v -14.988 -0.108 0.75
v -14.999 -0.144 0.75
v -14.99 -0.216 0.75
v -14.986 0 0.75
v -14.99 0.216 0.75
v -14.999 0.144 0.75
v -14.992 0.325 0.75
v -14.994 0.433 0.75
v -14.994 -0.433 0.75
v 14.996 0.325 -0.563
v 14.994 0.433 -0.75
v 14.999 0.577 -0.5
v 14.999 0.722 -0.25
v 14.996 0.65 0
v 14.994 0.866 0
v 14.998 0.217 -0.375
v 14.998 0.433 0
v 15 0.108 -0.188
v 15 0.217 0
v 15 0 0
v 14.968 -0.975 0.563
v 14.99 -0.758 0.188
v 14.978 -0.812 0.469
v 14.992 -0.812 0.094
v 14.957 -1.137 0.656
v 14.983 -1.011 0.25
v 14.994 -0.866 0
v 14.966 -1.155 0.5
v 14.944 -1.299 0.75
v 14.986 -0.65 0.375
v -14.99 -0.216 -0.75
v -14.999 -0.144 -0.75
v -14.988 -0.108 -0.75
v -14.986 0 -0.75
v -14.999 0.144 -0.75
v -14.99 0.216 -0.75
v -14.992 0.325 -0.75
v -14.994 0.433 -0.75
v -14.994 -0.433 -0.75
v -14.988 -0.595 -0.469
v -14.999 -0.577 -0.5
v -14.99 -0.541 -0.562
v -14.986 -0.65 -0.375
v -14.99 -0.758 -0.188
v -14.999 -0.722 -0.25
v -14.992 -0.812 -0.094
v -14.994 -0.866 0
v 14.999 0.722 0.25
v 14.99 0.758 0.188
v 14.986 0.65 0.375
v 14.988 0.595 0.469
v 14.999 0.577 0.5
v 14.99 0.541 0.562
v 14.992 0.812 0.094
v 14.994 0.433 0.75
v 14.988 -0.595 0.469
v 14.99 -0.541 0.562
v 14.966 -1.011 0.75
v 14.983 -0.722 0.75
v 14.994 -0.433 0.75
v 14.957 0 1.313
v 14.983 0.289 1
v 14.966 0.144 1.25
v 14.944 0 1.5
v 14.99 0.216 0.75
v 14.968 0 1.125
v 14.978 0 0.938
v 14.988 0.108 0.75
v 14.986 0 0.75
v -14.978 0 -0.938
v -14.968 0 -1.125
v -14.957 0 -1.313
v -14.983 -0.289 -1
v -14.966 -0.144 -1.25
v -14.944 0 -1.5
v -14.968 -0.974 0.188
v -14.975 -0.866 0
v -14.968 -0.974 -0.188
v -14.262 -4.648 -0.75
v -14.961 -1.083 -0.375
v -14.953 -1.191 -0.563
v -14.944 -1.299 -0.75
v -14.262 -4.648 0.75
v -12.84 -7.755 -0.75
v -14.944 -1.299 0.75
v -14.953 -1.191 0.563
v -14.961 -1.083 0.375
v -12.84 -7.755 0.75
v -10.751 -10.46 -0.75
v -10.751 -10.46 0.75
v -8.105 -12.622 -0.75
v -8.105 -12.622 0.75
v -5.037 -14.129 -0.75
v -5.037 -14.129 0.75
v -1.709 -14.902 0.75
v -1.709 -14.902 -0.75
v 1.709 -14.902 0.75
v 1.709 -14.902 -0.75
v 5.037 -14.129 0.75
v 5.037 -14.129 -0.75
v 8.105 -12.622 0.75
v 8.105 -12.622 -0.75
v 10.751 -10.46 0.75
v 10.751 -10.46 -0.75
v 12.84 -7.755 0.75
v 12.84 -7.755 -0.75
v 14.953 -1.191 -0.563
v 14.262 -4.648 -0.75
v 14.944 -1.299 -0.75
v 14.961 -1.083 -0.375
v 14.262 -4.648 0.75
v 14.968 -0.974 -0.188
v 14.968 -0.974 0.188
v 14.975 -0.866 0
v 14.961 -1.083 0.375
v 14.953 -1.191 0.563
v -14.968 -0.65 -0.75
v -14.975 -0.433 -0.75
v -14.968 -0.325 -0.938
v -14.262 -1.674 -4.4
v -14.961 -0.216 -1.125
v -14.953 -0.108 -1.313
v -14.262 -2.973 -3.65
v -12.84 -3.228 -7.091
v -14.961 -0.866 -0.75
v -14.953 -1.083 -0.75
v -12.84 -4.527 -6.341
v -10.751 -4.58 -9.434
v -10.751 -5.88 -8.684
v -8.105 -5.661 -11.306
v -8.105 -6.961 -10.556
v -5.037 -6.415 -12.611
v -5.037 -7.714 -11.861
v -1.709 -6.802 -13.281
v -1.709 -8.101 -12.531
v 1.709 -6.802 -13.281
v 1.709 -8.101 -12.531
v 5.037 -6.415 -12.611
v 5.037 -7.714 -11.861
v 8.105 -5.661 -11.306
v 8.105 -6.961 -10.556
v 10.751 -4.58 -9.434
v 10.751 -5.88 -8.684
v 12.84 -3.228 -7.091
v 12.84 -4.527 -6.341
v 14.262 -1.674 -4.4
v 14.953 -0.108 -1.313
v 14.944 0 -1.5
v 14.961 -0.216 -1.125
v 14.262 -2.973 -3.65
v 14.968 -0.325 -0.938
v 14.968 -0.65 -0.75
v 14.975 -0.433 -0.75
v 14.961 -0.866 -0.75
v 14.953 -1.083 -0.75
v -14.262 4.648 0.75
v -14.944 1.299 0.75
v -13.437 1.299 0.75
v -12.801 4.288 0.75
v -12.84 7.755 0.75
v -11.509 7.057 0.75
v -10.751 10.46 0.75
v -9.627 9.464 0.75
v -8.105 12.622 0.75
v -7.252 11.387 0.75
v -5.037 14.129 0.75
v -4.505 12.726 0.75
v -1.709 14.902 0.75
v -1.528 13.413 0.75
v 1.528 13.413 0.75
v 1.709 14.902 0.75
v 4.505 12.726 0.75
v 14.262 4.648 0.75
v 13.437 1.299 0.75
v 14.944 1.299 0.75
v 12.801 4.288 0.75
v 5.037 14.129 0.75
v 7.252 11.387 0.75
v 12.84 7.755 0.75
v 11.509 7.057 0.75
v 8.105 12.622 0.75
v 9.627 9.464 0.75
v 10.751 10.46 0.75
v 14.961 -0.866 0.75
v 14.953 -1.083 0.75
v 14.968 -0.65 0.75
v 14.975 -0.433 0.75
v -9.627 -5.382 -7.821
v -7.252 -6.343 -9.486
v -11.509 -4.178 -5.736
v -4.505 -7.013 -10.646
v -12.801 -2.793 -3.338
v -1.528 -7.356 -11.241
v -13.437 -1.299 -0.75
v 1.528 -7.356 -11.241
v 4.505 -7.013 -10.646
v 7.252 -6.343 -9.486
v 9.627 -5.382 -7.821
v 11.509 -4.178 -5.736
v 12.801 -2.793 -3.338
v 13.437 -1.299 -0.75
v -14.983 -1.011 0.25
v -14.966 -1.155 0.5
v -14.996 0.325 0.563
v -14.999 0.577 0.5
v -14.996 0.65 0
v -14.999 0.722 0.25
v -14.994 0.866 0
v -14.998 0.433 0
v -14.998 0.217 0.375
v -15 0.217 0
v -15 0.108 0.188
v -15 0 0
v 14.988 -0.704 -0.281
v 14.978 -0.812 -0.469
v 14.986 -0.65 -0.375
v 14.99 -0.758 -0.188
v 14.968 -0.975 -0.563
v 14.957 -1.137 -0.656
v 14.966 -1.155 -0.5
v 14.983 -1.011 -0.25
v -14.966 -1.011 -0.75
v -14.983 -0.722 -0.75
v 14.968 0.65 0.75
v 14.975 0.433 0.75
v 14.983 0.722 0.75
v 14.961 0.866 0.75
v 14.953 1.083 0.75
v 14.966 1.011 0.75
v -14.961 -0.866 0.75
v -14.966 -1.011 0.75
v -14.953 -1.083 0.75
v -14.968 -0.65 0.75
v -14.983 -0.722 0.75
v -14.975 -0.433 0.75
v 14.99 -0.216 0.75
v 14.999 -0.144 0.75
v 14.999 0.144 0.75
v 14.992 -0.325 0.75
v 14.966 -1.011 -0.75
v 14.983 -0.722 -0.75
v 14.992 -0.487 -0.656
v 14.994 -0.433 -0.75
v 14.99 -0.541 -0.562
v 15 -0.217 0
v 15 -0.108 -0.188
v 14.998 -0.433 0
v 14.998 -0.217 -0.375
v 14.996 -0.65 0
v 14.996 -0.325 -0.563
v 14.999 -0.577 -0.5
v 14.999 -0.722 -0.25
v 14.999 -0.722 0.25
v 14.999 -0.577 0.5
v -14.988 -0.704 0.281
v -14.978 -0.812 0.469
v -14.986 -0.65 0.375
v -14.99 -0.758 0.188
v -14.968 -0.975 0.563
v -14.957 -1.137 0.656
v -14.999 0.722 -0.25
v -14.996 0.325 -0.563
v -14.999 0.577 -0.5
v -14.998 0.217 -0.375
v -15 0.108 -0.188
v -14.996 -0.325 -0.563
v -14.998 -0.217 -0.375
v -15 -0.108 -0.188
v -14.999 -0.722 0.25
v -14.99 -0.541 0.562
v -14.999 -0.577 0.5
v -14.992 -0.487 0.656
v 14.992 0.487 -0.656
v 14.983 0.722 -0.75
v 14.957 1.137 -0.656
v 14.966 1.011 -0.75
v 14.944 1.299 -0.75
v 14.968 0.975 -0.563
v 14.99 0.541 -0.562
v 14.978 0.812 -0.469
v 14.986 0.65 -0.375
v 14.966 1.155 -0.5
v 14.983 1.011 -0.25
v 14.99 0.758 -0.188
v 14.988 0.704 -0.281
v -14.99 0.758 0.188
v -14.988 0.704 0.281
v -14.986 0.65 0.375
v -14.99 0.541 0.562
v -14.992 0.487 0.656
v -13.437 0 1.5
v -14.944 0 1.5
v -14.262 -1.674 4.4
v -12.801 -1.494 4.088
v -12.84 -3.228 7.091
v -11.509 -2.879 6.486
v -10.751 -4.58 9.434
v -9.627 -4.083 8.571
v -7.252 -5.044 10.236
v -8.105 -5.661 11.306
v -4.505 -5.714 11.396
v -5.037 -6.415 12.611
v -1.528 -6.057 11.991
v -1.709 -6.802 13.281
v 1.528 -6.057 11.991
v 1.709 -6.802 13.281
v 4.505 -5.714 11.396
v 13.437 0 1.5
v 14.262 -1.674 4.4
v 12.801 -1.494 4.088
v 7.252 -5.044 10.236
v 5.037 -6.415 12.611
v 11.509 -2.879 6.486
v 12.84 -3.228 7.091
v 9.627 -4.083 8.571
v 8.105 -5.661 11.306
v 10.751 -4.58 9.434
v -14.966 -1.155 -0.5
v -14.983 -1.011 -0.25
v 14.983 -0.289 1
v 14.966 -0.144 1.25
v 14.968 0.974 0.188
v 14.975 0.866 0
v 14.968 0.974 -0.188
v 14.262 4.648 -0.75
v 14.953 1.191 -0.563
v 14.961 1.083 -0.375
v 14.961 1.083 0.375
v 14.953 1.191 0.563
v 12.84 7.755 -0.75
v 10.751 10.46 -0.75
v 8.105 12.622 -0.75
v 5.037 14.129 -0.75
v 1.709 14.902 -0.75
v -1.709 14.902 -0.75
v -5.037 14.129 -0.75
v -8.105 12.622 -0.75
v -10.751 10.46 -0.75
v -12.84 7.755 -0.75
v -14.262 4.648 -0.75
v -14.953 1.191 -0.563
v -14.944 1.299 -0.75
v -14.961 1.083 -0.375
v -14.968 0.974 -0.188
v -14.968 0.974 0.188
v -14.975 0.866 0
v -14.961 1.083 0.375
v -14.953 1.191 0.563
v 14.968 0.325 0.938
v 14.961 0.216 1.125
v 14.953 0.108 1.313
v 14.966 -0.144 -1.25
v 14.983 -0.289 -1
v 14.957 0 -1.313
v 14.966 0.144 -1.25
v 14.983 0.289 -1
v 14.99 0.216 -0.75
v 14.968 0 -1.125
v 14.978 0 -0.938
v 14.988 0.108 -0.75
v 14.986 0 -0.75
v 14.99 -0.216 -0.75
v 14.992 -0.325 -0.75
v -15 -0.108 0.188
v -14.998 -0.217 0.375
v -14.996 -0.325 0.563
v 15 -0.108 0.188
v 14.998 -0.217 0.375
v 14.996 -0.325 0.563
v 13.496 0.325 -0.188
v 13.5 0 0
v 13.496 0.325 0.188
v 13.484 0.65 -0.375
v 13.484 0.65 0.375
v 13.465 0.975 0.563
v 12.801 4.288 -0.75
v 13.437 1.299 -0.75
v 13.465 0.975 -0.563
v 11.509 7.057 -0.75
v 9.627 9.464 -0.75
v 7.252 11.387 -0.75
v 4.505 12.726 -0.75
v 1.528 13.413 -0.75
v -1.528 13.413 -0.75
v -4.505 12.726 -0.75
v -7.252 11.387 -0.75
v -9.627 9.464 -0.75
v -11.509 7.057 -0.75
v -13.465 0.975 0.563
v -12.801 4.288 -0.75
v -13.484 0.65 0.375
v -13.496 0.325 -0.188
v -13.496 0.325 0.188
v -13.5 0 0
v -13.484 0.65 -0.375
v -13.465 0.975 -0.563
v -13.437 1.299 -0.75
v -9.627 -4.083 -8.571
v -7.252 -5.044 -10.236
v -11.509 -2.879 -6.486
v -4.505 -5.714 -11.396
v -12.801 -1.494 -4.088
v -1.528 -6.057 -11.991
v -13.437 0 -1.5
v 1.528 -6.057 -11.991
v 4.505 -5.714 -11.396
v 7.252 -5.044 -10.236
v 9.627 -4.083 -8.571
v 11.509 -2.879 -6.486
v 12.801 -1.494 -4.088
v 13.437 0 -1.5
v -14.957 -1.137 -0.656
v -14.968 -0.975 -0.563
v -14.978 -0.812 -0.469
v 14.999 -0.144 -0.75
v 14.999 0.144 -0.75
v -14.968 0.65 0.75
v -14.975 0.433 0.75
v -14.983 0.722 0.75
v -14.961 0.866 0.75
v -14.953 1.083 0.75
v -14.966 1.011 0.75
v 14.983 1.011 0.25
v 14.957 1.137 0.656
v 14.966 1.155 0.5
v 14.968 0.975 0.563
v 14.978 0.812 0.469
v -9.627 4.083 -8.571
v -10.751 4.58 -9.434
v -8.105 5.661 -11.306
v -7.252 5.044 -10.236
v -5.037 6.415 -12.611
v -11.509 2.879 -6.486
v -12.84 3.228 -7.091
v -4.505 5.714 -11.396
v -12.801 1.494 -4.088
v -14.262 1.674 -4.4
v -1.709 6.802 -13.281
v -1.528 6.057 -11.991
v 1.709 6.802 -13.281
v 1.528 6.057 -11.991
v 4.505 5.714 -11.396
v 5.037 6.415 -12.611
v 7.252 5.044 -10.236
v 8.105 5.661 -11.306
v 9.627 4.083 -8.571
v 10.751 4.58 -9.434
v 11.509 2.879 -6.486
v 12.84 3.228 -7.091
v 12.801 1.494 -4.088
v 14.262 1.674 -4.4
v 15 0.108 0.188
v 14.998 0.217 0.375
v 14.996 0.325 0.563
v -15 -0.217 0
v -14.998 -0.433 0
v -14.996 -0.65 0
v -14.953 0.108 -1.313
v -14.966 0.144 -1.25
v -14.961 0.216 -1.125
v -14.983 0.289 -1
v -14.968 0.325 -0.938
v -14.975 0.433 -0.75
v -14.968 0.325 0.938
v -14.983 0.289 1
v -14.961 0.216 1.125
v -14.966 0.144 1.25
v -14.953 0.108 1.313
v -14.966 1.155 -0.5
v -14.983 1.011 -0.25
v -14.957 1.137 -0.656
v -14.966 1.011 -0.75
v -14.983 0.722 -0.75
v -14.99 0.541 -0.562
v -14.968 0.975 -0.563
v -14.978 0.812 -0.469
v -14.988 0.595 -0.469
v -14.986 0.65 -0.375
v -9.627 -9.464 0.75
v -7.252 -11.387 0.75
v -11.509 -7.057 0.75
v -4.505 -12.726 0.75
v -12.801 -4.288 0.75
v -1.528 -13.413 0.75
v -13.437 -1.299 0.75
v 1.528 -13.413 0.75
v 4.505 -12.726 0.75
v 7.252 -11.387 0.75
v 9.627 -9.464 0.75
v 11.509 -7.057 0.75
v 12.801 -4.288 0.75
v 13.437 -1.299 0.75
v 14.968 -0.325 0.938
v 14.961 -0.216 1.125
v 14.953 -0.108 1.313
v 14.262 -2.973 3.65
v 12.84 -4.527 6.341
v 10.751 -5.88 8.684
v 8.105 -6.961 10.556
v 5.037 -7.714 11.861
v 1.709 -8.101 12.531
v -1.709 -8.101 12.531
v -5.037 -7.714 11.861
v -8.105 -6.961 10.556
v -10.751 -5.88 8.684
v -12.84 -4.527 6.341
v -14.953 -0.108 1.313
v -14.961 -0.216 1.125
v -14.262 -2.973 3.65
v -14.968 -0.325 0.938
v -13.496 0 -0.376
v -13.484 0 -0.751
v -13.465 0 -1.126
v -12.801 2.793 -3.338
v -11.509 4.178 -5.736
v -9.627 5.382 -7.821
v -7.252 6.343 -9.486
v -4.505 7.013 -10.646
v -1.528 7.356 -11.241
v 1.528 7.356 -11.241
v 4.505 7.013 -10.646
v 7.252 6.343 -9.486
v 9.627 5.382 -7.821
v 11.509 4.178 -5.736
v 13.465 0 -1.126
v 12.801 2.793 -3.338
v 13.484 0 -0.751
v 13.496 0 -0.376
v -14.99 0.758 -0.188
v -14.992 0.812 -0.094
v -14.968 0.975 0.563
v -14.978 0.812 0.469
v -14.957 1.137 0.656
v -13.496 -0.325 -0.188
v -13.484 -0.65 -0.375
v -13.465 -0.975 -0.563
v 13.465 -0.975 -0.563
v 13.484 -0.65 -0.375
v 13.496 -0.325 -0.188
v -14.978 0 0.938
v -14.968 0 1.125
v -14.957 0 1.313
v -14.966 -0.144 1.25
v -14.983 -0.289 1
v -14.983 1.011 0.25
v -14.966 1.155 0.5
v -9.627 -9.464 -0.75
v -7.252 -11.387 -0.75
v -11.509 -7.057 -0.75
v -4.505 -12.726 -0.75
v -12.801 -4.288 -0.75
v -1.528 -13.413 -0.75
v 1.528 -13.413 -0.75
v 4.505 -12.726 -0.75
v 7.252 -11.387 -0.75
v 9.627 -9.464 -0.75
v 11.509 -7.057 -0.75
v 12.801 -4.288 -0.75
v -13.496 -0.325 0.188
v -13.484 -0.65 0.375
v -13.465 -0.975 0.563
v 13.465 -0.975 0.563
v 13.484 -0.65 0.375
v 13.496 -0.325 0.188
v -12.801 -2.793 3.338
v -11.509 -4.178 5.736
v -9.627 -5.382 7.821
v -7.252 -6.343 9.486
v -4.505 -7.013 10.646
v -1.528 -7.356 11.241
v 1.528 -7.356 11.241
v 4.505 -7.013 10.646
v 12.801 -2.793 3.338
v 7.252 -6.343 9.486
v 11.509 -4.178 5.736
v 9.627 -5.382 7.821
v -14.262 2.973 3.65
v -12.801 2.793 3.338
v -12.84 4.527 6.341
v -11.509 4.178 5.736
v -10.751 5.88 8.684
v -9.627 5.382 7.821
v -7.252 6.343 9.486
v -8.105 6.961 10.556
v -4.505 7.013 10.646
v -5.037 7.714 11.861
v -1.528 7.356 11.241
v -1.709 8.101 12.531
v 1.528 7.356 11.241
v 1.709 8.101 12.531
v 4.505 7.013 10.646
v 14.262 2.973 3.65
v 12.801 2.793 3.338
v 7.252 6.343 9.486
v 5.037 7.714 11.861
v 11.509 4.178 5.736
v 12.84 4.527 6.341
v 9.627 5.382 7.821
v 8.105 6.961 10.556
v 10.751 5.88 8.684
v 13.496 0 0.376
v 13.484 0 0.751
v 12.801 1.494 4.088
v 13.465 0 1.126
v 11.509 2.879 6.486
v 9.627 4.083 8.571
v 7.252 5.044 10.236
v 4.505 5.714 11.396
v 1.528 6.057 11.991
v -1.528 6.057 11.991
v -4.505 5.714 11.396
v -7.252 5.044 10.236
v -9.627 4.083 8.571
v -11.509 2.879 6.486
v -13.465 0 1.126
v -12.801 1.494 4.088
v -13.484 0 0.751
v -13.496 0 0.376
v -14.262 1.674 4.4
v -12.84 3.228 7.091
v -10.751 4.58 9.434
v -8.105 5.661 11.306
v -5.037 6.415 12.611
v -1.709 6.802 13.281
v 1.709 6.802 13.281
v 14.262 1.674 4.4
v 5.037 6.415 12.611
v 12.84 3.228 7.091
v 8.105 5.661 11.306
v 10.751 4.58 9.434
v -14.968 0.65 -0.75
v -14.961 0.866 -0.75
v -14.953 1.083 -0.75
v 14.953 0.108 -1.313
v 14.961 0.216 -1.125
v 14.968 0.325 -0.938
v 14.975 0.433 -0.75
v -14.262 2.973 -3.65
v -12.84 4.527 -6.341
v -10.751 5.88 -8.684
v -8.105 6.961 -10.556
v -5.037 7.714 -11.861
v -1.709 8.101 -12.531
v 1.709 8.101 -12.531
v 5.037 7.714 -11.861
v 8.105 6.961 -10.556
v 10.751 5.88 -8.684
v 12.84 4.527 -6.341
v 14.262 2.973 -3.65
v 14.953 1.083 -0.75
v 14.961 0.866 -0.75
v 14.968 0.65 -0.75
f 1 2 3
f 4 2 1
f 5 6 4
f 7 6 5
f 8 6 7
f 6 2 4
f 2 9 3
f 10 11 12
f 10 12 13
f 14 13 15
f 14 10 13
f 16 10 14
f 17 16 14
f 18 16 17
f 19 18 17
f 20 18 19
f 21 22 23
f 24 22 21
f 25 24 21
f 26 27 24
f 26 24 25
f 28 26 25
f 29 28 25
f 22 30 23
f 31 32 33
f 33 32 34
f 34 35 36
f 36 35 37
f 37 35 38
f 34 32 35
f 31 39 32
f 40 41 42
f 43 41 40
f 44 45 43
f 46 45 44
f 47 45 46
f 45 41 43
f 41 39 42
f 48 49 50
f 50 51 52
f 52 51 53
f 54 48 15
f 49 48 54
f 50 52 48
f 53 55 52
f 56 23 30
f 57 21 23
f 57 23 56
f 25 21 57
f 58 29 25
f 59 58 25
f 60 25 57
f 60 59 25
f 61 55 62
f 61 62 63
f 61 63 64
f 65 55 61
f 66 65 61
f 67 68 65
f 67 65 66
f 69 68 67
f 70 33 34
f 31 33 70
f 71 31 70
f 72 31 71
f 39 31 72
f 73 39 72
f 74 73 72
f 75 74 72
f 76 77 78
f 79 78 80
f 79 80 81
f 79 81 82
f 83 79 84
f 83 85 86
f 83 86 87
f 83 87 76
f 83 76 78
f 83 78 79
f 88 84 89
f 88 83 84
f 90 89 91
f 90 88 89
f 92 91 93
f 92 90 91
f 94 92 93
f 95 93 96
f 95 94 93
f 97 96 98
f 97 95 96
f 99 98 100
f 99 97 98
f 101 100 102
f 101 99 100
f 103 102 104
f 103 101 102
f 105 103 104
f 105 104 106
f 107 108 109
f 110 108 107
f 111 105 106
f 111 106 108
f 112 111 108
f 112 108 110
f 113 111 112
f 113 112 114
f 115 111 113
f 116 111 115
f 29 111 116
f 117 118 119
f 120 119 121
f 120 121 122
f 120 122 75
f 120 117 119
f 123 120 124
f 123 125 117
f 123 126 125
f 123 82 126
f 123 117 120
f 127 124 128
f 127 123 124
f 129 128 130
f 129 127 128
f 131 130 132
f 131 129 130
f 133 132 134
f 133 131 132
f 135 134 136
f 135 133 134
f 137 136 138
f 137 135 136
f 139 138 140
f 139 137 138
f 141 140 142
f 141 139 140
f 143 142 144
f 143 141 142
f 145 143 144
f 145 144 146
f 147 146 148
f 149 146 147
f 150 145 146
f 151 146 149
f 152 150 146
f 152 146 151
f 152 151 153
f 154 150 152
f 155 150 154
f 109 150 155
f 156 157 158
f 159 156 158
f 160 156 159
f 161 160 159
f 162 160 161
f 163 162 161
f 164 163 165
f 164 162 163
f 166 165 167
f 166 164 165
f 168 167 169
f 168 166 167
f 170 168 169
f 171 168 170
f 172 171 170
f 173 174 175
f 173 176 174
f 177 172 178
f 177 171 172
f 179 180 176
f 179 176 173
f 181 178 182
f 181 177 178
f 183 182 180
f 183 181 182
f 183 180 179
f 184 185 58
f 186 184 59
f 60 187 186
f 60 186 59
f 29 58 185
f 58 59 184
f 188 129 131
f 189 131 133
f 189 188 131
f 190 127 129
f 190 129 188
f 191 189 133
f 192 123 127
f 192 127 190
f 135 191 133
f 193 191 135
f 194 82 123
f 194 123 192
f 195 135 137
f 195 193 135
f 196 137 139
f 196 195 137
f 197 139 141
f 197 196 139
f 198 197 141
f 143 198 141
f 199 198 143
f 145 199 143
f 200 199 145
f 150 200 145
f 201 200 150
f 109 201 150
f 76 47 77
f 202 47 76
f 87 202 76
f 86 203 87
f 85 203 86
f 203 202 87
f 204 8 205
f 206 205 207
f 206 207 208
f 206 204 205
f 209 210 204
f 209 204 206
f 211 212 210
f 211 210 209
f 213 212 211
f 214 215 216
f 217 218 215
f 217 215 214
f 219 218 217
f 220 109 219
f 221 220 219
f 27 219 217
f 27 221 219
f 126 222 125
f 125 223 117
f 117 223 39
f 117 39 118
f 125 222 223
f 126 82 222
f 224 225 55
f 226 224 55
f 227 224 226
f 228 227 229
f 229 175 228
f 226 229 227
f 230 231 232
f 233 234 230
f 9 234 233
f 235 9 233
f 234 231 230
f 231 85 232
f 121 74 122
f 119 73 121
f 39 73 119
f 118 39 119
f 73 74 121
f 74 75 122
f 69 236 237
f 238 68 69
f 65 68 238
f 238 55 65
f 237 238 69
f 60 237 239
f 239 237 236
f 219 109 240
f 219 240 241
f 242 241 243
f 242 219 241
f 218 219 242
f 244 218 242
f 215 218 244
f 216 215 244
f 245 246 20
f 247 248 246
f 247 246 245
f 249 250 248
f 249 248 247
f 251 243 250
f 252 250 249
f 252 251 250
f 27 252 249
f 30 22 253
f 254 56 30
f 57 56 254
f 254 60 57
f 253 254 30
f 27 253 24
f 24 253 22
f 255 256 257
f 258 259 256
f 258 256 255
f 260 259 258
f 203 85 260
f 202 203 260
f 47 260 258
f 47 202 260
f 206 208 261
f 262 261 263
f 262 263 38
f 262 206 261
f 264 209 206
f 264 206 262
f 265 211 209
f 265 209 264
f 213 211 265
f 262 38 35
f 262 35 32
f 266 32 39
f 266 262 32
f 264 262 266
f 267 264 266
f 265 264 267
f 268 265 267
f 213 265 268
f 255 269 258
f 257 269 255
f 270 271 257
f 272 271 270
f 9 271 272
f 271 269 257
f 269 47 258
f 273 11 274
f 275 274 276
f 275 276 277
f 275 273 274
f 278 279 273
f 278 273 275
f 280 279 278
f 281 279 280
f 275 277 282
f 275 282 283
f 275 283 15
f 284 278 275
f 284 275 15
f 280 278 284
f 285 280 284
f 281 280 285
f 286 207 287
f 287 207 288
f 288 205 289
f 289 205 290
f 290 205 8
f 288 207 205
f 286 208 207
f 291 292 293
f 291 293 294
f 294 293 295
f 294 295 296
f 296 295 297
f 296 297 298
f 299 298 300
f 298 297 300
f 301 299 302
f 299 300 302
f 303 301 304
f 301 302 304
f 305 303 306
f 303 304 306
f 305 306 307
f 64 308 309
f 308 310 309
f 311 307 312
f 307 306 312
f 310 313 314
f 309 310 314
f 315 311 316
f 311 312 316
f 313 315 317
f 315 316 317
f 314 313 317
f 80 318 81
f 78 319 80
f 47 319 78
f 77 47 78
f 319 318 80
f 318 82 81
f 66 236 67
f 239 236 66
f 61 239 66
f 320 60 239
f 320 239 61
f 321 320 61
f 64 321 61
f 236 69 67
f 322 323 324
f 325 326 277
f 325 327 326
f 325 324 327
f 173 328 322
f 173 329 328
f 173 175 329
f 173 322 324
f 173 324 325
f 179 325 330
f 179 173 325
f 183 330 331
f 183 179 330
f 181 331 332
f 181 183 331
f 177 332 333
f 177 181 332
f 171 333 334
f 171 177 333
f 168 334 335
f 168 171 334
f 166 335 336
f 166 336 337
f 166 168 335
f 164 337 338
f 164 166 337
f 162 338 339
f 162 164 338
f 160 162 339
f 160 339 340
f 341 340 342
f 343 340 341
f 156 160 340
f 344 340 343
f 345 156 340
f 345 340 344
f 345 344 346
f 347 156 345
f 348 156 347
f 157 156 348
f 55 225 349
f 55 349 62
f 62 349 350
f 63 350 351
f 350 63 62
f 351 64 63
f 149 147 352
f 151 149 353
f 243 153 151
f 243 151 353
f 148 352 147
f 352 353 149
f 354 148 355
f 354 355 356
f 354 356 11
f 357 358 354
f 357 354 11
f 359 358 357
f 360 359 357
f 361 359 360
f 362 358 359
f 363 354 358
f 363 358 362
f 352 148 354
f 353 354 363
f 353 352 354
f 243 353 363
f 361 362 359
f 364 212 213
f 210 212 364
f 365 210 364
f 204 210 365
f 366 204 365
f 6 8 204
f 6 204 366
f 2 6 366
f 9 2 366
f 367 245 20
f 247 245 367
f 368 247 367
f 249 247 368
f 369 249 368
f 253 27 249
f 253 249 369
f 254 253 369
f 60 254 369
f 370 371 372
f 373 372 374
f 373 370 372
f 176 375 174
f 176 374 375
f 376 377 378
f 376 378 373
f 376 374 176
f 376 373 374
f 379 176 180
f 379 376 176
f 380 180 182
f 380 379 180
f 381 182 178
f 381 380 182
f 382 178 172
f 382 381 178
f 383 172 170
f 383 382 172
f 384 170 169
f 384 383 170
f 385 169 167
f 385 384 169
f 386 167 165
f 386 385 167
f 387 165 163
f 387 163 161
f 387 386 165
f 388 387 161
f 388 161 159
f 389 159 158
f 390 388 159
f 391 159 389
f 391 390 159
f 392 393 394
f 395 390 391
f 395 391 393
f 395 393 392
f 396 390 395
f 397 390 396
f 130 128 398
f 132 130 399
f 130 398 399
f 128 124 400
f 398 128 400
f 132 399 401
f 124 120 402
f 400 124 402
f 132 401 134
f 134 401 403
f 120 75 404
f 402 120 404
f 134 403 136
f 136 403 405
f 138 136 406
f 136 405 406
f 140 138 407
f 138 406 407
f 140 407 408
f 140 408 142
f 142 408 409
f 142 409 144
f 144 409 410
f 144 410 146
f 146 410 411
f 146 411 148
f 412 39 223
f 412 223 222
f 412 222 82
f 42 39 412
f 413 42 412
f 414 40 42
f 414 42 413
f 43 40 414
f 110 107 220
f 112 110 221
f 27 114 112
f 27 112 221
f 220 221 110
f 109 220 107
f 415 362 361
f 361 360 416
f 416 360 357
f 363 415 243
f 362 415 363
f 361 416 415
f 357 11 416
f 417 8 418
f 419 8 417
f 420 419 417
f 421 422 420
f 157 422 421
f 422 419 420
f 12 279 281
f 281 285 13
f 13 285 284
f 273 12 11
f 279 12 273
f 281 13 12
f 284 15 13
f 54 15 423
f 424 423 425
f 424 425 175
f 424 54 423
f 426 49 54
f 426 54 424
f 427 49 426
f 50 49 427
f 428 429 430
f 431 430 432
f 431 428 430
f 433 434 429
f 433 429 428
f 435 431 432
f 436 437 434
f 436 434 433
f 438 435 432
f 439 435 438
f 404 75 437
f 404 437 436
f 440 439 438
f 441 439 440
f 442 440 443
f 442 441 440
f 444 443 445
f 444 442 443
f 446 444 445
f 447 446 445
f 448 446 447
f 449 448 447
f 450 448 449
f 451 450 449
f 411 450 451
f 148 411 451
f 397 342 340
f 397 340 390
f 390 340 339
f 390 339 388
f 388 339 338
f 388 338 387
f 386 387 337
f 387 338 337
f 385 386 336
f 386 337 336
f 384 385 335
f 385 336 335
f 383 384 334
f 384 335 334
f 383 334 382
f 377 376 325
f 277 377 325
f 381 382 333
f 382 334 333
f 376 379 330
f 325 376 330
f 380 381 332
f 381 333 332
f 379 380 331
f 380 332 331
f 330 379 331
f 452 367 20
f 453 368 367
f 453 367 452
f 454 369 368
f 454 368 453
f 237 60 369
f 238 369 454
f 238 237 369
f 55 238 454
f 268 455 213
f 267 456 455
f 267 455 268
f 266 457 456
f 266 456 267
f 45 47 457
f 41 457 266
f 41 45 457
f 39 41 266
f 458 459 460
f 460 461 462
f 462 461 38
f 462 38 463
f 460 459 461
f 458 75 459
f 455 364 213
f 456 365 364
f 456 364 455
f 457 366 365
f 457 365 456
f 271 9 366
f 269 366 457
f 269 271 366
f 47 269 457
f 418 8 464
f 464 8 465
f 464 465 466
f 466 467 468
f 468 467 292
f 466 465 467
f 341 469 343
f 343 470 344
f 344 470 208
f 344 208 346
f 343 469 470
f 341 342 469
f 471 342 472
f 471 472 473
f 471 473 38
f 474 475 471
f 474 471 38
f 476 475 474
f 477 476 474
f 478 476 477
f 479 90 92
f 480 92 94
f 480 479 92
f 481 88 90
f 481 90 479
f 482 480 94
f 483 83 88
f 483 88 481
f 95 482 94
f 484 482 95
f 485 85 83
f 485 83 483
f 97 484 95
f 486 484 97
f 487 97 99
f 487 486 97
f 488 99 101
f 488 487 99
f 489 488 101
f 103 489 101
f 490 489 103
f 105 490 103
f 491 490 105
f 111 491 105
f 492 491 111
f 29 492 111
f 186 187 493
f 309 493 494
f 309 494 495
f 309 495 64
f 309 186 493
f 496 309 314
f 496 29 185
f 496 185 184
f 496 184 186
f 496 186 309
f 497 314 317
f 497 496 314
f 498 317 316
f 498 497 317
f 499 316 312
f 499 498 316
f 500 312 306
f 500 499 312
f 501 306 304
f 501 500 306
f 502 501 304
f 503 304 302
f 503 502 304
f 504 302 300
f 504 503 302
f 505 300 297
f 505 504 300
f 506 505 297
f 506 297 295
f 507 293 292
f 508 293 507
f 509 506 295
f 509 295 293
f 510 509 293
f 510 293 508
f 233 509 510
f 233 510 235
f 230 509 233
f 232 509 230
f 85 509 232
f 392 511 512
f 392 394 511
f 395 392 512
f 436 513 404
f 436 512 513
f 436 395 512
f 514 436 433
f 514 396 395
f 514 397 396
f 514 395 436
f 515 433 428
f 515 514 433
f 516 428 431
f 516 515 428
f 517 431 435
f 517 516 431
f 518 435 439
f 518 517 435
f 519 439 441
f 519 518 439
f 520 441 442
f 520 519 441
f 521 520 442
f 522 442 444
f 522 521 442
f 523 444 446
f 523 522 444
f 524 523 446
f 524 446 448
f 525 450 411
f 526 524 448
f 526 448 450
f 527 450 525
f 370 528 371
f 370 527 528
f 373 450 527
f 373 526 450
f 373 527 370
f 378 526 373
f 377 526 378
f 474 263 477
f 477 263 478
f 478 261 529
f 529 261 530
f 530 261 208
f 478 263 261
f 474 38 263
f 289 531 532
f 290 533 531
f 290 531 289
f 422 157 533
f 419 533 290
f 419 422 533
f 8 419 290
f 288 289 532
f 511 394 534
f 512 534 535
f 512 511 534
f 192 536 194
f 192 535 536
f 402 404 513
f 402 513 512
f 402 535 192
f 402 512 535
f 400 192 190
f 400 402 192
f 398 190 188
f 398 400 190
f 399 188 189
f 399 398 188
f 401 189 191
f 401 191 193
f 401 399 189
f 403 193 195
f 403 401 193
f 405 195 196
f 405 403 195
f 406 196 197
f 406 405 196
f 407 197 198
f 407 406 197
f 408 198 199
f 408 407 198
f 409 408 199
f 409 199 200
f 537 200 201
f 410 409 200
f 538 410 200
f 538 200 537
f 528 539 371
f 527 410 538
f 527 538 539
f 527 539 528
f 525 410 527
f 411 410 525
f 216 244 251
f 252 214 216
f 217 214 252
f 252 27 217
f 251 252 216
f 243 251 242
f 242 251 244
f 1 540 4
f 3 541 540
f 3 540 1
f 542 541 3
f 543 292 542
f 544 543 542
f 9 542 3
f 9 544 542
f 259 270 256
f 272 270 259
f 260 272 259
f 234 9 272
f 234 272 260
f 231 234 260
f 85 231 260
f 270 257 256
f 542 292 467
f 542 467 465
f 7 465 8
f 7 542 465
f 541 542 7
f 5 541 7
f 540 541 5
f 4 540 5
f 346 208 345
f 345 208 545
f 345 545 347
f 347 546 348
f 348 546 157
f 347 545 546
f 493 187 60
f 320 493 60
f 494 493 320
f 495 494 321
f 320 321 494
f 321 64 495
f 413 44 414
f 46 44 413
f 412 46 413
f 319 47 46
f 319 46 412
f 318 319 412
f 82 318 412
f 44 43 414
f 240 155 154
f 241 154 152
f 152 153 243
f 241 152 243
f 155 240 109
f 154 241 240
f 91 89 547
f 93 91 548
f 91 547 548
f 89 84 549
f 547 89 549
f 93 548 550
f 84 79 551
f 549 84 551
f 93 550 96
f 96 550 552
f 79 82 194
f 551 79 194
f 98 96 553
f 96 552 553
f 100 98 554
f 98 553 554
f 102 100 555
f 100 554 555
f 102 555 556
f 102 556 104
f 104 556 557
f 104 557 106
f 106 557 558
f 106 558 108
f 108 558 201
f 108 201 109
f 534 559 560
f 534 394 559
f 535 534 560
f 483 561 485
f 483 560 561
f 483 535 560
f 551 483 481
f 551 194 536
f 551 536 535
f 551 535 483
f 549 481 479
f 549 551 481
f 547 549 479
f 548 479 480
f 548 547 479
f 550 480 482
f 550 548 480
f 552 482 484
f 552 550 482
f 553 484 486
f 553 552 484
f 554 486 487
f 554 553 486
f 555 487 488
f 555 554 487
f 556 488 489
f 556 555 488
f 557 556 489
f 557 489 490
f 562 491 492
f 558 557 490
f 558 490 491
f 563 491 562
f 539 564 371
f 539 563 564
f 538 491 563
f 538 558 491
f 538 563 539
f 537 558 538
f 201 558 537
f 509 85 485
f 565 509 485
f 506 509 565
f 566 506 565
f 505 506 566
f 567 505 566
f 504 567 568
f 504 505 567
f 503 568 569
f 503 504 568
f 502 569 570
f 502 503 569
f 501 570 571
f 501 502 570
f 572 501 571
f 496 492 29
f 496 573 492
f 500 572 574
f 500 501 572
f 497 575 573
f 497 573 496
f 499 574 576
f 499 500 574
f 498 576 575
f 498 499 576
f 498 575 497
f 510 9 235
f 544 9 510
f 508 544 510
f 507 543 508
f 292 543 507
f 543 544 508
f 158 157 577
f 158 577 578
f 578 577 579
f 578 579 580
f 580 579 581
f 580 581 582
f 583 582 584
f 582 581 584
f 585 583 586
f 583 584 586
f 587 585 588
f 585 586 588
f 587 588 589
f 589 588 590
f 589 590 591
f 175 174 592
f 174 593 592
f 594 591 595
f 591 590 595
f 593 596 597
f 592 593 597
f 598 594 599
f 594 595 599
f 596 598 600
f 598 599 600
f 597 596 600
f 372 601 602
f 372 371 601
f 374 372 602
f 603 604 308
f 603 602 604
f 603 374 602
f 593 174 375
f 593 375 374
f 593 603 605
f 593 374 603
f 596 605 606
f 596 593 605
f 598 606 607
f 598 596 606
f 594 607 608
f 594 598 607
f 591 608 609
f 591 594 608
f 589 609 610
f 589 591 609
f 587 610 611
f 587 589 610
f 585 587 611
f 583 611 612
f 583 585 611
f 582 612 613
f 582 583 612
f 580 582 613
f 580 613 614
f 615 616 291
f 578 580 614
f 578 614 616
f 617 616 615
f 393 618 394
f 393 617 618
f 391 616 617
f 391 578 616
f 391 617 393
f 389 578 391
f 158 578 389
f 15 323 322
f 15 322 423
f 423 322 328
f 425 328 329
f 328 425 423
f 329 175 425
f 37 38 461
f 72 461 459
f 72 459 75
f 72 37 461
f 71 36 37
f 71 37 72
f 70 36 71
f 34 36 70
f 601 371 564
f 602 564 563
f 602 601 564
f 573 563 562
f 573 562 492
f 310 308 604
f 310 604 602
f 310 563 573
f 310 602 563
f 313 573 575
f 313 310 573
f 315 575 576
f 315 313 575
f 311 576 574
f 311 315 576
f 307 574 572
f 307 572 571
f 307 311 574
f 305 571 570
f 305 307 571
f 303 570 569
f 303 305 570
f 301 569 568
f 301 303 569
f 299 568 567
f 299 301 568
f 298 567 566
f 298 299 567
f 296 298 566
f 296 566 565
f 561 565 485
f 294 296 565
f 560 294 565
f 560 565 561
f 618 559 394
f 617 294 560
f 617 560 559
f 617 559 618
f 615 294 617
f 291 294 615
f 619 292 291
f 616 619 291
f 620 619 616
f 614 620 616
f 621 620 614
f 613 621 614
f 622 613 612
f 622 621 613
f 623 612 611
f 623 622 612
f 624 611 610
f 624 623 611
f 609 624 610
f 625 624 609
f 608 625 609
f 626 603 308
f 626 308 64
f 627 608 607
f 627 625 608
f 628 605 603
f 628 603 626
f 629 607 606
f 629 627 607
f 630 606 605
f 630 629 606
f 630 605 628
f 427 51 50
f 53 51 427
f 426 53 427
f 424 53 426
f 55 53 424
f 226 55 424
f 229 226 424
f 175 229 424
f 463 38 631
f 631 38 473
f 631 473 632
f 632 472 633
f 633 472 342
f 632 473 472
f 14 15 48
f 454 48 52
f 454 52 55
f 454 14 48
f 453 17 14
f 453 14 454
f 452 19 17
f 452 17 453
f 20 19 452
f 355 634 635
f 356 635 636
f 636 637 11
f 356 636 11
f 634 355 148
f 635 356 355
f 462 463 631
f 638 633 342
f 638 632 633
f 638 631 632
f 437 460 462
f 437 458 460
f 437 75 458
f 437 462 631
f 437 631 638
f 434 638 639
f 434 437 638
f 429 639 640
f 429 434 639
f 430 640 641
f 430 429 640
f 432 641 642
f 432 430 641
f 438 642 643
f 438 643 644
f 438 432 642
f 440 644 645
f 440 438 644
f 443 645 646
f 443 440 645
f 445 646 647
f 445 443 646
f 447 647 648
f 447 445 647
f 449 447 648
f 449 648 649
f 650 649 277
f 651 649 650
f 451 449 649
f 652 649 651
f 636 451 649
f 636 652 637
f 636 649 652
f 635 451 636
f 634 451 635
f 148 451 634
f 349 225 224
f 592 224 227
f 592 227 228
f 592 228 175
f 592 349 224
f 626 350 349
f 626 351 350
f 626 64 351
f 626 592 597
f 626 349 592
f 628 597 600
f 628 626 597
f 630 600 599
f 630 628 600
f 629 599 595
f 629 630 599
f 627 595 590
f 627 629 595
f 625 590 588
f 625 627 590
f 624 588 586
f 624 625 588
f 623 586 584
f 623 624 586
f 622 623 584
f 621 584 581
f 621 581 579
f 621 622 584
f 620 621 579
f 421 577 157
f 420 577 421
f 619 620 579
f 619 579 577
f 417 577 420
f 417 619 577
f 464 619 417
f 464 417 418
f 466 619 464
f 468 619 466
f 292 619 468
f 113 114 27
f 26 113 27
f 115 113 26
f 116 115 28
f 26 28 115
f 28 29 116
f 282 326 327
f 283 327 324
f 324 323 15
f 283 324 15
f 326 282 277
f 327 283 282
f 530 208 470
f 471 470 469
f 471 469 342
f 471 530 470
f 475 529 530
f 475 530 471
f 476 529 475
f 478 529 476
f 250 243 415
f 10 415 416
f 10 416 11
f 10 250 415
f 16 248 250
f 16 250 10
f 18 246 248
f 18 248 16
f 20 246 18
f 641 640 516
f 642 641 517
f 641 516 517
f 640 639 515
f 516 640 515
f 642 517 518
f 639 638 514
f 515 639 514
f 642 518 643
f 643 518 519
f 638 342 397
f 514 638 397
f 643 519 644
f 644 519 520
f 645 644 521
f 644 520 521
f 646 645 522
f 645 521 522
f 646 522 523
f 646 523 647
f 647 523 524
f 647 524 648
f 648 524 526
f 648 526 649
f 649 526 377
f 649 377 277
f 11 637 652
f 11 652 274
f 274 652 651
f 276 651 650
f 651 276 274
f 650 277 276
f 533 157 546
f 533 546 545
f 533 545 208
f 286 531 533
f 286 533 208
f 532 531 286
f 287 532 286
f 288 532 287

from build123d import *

# Parameters (mm, degrees)
SKETCH1_R           = 15
SKETCH1_R_2         = 13.5
BOSS_EXTRUDE1_DEPTH = 0.75
CIRPATTERN1_COUNT   = 6


with BuildPart() as part:
    # Sketch1 → Boss-Extrude1 (new, symmetric)
    with BuildSketch(Plane.XY):
        Circle(SKETCH1_R)
        Circle(SKETCH1_R_2, mode=Mode.SUBTRACT)
    boss_extrude1 = extrude(amount=BOSS_EXTRUDE1_DEPTH, both=True)

    # CirPattern1: Boss-Extrude1 ×6 about axis
    cirpattern1_axis = Axis((16.5, 0, 0), (-1, 0, 0))
    for i in range(1, CIRPATTERN1_COUNT):
        add(boss_extrude1.rotate(cirpattern1_axis, i * 360 / CIRPATTERN1_COUNT))


solid = part.part
